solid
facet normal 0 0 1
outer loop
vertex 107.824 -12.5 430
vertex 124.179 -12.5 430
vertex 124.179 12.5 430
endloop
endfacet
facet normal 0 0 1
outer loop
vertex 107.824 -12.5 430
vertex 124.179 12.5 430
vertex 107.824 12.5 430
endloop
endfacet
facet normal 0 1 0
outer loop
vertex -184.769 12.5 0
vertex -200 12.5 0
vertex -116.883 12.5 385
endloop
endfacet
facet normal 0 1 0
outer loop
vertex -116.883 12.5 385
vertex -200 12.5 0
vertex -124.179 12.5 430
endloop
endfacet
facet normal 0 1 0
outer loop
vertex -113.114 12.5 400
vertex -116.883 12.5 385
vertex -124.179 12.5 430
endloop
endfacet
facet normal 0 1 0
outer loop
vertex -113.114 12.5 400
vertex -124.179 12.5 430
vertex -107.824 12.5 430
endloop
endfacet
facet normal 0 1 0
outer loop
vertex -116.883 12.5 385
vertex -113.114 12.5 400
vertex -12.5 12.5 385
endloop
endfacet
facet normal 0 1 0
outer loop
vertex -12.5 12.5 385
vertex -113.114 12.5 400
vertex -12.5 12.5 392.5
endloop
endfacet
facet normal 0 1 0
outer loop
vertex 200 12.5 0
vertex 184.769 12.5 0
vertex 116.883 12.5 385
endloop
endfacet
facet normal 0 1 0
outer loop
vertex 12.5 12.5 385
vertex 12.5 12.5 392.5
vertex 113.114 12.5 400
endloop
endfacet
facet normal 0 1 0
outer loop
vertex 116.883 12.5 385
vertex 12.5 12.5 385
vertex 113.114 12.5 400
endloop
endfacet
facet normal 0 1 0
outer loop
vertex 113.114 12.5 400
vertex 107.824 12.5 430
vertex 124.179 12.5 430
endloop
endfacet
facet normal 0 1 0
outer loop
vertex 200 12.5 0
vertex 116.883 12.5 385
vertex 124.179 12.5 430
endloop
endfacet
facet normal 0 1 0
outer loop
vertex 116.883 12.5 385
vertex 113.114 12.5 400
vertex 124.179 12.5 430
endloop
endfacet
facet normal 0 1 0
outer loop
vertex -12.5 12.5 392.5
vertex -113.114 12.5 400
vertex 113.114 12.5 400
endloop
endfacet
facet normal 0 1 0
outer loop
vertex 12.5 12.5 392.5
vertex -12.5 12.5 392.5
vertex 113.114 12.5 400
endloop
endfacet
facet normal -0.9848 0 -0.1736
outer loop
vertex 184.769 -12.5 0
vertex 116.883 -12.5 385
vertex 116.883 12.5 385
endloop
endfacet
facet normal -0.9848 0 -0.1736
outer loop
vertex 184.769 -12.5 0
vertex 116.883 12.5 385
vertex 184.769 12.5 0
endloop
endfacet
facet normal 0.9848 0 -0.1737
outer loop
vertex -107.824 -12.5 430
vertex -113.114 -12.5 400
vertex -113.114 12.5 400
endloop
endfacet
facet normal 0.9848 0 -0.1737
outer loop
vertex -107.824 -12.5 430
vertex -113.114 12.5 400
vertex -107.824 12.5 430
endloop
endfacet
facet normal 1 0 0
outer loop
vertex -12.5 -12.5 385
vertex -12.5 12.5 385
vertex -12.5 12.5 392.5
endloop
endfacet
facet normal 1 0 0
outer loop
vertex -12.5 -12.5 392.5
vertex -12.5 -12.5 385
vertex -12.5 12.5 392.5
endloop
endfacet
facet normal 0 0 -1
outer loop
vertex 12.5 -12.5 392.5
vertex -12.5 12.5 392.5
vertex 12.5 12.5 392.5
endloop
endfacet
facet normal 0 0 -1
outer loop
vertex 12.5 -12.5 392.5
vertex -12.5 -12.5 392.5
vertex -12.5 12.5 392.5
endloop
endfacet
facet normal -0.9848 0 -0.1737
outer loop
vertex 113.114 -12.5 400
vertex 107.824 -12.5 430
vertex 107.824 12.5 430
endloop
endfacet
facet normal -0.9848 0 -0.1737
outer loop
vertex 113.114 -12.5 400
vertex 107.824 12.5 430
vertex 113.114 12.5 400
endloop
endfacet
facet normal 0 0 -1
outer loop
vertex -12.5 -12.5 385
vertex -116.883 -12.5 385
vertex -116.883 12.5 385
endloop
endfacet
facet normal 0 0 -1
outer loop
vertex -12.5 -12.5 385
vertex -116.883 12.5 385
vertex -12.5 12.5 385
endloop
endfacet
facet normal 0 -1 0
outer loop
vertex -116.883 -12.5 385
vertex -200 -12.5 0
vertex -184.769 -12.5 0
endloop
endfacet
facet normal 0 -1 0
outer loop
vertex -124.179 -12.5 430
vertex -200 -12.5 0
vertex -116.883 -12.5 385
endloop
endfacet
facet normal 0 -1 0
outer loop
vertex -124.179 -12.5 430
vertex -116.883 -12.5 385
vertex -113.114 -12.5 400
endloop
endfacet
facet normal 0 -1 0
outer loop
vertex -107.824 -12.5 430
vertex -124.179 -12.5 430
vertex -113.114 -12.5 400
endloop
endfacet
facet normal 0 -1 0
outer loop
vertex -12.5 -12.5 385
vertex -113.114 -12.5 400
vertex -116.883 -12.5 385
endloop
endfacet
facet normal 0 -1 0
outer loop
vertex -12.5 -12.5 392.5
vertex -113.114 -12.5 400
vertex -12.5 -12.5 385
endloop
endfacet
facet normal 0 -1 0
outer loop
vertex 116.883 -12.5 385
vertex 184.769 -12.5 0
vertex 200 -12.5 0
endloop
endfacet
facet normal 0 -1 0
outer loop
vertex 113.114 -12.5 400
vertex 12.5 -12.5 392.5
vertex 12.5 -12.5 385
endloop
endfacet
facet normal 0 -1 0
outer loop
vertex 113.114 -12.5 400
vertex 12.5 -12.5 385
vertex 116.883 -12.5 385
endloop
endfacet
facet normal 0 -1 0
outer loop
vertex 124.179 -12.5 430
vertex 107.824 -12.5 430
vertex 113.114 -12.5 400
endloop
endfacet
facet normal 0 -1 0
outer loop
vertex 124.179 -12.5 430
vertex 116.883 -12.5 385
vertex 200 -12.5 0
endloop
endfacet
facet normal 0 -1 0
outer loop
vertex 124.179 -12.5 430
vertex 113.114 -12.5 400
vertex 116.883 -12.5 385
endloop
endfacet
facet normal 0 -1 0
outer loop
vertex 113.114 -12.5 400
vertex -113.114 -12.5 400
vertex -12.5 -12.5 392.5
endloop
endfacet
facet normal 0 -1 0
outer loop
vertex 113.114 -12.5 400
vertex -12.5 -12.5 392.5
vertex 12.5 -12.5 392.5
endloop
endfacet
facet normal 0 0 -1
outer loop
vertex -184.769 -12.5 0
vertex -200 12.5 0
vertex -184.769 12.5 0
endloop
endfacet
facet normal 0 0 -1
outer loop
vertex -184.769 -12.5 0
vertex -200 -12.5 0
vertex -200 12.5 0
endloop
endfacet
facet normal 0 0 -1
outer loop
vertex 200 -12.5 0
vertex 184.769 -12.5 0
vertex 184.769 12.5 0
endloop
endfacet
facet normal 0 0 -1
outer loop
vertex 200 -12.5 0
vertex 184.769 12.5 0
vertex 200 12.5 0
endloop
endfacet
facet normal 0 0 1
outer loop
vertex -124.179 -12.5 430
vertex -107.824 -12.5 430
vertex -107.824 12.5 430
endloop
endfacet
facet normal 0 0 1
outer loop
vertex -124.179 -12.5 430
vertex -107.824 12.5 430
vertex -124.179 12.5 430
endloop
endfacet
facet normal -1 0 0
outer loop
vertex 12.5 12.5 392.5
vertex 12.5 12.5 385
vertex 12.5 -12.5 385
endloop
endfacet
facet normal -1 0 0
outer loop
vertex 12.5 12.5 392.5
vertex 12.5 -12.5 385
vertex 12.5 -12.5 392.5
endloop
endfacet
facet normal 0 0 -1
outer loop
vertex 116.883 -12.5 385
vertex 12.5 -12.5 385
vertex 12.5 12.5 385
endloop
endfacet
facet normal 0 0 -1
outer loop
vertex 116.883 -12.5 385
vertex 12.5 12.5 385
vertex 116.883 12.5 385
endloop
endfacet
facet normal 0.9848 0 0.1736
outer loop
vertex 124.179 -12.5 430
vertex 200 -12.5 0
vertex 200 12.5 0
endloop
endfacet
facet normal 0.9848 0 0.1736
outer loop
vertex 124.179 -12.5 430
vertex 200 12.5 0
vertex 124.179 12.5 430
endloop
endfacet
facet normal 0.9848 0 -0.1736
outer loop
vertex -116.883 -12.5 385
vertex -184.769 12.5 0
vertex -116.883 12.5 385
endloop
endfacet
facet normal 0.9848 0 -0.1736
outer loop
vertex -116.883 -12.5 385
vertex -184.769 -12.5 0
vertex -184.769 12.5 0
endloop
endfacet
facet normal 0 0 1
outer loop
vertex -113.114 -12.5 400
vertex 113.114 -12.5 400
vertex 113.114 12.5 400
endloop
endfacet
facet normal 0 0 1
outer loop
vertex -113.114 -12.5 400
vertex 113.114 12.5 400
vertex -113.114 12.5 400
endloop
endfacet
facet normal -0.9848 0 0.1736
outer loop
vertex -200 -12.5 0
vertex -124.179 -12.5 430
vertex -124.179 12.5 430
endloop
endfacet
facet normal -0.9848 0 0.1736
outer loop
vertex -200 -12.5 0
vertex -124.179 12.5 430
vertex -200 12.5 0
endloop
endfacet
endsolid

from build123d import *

# Parameters (mm, degrees)
F1_DEPTH = 12.5
F2_W     = 25
F2_H     = 7.5
F3_DEPTH = 12.5


with BuildPart() as f1:
    # F0 (on Front) → F1 (new body, symmetric)
    with BuildSketch(Plane.XZ):
        Polygon((-116.882713, 385), (0, 385), (0, 400), (-113.113844, 400), (-107.824034, 430), (-124.179398, 430), (-200, 0), (-184.768601, 0), align=None)
        Polygon((0, 400), (0, 385), (116.882713, 385), (184.768601, 0), (200, 0), (124.179398, 430), (107.824034, 430), (113.113844, 400), align=None)
    extrude(amount=F1_DEPTH, both=True)

    # F2 (on Front) → F3 (cut, symmetric)
    with BuildSketch(Plane.XZ):
        with Locations((0, 388.75)):
            Rectangle(F2_W, F2_H)
    extrude(amount=F3_DEPTH, both=True, mode=Mode.SUBTRACT)


solid = f1.part
